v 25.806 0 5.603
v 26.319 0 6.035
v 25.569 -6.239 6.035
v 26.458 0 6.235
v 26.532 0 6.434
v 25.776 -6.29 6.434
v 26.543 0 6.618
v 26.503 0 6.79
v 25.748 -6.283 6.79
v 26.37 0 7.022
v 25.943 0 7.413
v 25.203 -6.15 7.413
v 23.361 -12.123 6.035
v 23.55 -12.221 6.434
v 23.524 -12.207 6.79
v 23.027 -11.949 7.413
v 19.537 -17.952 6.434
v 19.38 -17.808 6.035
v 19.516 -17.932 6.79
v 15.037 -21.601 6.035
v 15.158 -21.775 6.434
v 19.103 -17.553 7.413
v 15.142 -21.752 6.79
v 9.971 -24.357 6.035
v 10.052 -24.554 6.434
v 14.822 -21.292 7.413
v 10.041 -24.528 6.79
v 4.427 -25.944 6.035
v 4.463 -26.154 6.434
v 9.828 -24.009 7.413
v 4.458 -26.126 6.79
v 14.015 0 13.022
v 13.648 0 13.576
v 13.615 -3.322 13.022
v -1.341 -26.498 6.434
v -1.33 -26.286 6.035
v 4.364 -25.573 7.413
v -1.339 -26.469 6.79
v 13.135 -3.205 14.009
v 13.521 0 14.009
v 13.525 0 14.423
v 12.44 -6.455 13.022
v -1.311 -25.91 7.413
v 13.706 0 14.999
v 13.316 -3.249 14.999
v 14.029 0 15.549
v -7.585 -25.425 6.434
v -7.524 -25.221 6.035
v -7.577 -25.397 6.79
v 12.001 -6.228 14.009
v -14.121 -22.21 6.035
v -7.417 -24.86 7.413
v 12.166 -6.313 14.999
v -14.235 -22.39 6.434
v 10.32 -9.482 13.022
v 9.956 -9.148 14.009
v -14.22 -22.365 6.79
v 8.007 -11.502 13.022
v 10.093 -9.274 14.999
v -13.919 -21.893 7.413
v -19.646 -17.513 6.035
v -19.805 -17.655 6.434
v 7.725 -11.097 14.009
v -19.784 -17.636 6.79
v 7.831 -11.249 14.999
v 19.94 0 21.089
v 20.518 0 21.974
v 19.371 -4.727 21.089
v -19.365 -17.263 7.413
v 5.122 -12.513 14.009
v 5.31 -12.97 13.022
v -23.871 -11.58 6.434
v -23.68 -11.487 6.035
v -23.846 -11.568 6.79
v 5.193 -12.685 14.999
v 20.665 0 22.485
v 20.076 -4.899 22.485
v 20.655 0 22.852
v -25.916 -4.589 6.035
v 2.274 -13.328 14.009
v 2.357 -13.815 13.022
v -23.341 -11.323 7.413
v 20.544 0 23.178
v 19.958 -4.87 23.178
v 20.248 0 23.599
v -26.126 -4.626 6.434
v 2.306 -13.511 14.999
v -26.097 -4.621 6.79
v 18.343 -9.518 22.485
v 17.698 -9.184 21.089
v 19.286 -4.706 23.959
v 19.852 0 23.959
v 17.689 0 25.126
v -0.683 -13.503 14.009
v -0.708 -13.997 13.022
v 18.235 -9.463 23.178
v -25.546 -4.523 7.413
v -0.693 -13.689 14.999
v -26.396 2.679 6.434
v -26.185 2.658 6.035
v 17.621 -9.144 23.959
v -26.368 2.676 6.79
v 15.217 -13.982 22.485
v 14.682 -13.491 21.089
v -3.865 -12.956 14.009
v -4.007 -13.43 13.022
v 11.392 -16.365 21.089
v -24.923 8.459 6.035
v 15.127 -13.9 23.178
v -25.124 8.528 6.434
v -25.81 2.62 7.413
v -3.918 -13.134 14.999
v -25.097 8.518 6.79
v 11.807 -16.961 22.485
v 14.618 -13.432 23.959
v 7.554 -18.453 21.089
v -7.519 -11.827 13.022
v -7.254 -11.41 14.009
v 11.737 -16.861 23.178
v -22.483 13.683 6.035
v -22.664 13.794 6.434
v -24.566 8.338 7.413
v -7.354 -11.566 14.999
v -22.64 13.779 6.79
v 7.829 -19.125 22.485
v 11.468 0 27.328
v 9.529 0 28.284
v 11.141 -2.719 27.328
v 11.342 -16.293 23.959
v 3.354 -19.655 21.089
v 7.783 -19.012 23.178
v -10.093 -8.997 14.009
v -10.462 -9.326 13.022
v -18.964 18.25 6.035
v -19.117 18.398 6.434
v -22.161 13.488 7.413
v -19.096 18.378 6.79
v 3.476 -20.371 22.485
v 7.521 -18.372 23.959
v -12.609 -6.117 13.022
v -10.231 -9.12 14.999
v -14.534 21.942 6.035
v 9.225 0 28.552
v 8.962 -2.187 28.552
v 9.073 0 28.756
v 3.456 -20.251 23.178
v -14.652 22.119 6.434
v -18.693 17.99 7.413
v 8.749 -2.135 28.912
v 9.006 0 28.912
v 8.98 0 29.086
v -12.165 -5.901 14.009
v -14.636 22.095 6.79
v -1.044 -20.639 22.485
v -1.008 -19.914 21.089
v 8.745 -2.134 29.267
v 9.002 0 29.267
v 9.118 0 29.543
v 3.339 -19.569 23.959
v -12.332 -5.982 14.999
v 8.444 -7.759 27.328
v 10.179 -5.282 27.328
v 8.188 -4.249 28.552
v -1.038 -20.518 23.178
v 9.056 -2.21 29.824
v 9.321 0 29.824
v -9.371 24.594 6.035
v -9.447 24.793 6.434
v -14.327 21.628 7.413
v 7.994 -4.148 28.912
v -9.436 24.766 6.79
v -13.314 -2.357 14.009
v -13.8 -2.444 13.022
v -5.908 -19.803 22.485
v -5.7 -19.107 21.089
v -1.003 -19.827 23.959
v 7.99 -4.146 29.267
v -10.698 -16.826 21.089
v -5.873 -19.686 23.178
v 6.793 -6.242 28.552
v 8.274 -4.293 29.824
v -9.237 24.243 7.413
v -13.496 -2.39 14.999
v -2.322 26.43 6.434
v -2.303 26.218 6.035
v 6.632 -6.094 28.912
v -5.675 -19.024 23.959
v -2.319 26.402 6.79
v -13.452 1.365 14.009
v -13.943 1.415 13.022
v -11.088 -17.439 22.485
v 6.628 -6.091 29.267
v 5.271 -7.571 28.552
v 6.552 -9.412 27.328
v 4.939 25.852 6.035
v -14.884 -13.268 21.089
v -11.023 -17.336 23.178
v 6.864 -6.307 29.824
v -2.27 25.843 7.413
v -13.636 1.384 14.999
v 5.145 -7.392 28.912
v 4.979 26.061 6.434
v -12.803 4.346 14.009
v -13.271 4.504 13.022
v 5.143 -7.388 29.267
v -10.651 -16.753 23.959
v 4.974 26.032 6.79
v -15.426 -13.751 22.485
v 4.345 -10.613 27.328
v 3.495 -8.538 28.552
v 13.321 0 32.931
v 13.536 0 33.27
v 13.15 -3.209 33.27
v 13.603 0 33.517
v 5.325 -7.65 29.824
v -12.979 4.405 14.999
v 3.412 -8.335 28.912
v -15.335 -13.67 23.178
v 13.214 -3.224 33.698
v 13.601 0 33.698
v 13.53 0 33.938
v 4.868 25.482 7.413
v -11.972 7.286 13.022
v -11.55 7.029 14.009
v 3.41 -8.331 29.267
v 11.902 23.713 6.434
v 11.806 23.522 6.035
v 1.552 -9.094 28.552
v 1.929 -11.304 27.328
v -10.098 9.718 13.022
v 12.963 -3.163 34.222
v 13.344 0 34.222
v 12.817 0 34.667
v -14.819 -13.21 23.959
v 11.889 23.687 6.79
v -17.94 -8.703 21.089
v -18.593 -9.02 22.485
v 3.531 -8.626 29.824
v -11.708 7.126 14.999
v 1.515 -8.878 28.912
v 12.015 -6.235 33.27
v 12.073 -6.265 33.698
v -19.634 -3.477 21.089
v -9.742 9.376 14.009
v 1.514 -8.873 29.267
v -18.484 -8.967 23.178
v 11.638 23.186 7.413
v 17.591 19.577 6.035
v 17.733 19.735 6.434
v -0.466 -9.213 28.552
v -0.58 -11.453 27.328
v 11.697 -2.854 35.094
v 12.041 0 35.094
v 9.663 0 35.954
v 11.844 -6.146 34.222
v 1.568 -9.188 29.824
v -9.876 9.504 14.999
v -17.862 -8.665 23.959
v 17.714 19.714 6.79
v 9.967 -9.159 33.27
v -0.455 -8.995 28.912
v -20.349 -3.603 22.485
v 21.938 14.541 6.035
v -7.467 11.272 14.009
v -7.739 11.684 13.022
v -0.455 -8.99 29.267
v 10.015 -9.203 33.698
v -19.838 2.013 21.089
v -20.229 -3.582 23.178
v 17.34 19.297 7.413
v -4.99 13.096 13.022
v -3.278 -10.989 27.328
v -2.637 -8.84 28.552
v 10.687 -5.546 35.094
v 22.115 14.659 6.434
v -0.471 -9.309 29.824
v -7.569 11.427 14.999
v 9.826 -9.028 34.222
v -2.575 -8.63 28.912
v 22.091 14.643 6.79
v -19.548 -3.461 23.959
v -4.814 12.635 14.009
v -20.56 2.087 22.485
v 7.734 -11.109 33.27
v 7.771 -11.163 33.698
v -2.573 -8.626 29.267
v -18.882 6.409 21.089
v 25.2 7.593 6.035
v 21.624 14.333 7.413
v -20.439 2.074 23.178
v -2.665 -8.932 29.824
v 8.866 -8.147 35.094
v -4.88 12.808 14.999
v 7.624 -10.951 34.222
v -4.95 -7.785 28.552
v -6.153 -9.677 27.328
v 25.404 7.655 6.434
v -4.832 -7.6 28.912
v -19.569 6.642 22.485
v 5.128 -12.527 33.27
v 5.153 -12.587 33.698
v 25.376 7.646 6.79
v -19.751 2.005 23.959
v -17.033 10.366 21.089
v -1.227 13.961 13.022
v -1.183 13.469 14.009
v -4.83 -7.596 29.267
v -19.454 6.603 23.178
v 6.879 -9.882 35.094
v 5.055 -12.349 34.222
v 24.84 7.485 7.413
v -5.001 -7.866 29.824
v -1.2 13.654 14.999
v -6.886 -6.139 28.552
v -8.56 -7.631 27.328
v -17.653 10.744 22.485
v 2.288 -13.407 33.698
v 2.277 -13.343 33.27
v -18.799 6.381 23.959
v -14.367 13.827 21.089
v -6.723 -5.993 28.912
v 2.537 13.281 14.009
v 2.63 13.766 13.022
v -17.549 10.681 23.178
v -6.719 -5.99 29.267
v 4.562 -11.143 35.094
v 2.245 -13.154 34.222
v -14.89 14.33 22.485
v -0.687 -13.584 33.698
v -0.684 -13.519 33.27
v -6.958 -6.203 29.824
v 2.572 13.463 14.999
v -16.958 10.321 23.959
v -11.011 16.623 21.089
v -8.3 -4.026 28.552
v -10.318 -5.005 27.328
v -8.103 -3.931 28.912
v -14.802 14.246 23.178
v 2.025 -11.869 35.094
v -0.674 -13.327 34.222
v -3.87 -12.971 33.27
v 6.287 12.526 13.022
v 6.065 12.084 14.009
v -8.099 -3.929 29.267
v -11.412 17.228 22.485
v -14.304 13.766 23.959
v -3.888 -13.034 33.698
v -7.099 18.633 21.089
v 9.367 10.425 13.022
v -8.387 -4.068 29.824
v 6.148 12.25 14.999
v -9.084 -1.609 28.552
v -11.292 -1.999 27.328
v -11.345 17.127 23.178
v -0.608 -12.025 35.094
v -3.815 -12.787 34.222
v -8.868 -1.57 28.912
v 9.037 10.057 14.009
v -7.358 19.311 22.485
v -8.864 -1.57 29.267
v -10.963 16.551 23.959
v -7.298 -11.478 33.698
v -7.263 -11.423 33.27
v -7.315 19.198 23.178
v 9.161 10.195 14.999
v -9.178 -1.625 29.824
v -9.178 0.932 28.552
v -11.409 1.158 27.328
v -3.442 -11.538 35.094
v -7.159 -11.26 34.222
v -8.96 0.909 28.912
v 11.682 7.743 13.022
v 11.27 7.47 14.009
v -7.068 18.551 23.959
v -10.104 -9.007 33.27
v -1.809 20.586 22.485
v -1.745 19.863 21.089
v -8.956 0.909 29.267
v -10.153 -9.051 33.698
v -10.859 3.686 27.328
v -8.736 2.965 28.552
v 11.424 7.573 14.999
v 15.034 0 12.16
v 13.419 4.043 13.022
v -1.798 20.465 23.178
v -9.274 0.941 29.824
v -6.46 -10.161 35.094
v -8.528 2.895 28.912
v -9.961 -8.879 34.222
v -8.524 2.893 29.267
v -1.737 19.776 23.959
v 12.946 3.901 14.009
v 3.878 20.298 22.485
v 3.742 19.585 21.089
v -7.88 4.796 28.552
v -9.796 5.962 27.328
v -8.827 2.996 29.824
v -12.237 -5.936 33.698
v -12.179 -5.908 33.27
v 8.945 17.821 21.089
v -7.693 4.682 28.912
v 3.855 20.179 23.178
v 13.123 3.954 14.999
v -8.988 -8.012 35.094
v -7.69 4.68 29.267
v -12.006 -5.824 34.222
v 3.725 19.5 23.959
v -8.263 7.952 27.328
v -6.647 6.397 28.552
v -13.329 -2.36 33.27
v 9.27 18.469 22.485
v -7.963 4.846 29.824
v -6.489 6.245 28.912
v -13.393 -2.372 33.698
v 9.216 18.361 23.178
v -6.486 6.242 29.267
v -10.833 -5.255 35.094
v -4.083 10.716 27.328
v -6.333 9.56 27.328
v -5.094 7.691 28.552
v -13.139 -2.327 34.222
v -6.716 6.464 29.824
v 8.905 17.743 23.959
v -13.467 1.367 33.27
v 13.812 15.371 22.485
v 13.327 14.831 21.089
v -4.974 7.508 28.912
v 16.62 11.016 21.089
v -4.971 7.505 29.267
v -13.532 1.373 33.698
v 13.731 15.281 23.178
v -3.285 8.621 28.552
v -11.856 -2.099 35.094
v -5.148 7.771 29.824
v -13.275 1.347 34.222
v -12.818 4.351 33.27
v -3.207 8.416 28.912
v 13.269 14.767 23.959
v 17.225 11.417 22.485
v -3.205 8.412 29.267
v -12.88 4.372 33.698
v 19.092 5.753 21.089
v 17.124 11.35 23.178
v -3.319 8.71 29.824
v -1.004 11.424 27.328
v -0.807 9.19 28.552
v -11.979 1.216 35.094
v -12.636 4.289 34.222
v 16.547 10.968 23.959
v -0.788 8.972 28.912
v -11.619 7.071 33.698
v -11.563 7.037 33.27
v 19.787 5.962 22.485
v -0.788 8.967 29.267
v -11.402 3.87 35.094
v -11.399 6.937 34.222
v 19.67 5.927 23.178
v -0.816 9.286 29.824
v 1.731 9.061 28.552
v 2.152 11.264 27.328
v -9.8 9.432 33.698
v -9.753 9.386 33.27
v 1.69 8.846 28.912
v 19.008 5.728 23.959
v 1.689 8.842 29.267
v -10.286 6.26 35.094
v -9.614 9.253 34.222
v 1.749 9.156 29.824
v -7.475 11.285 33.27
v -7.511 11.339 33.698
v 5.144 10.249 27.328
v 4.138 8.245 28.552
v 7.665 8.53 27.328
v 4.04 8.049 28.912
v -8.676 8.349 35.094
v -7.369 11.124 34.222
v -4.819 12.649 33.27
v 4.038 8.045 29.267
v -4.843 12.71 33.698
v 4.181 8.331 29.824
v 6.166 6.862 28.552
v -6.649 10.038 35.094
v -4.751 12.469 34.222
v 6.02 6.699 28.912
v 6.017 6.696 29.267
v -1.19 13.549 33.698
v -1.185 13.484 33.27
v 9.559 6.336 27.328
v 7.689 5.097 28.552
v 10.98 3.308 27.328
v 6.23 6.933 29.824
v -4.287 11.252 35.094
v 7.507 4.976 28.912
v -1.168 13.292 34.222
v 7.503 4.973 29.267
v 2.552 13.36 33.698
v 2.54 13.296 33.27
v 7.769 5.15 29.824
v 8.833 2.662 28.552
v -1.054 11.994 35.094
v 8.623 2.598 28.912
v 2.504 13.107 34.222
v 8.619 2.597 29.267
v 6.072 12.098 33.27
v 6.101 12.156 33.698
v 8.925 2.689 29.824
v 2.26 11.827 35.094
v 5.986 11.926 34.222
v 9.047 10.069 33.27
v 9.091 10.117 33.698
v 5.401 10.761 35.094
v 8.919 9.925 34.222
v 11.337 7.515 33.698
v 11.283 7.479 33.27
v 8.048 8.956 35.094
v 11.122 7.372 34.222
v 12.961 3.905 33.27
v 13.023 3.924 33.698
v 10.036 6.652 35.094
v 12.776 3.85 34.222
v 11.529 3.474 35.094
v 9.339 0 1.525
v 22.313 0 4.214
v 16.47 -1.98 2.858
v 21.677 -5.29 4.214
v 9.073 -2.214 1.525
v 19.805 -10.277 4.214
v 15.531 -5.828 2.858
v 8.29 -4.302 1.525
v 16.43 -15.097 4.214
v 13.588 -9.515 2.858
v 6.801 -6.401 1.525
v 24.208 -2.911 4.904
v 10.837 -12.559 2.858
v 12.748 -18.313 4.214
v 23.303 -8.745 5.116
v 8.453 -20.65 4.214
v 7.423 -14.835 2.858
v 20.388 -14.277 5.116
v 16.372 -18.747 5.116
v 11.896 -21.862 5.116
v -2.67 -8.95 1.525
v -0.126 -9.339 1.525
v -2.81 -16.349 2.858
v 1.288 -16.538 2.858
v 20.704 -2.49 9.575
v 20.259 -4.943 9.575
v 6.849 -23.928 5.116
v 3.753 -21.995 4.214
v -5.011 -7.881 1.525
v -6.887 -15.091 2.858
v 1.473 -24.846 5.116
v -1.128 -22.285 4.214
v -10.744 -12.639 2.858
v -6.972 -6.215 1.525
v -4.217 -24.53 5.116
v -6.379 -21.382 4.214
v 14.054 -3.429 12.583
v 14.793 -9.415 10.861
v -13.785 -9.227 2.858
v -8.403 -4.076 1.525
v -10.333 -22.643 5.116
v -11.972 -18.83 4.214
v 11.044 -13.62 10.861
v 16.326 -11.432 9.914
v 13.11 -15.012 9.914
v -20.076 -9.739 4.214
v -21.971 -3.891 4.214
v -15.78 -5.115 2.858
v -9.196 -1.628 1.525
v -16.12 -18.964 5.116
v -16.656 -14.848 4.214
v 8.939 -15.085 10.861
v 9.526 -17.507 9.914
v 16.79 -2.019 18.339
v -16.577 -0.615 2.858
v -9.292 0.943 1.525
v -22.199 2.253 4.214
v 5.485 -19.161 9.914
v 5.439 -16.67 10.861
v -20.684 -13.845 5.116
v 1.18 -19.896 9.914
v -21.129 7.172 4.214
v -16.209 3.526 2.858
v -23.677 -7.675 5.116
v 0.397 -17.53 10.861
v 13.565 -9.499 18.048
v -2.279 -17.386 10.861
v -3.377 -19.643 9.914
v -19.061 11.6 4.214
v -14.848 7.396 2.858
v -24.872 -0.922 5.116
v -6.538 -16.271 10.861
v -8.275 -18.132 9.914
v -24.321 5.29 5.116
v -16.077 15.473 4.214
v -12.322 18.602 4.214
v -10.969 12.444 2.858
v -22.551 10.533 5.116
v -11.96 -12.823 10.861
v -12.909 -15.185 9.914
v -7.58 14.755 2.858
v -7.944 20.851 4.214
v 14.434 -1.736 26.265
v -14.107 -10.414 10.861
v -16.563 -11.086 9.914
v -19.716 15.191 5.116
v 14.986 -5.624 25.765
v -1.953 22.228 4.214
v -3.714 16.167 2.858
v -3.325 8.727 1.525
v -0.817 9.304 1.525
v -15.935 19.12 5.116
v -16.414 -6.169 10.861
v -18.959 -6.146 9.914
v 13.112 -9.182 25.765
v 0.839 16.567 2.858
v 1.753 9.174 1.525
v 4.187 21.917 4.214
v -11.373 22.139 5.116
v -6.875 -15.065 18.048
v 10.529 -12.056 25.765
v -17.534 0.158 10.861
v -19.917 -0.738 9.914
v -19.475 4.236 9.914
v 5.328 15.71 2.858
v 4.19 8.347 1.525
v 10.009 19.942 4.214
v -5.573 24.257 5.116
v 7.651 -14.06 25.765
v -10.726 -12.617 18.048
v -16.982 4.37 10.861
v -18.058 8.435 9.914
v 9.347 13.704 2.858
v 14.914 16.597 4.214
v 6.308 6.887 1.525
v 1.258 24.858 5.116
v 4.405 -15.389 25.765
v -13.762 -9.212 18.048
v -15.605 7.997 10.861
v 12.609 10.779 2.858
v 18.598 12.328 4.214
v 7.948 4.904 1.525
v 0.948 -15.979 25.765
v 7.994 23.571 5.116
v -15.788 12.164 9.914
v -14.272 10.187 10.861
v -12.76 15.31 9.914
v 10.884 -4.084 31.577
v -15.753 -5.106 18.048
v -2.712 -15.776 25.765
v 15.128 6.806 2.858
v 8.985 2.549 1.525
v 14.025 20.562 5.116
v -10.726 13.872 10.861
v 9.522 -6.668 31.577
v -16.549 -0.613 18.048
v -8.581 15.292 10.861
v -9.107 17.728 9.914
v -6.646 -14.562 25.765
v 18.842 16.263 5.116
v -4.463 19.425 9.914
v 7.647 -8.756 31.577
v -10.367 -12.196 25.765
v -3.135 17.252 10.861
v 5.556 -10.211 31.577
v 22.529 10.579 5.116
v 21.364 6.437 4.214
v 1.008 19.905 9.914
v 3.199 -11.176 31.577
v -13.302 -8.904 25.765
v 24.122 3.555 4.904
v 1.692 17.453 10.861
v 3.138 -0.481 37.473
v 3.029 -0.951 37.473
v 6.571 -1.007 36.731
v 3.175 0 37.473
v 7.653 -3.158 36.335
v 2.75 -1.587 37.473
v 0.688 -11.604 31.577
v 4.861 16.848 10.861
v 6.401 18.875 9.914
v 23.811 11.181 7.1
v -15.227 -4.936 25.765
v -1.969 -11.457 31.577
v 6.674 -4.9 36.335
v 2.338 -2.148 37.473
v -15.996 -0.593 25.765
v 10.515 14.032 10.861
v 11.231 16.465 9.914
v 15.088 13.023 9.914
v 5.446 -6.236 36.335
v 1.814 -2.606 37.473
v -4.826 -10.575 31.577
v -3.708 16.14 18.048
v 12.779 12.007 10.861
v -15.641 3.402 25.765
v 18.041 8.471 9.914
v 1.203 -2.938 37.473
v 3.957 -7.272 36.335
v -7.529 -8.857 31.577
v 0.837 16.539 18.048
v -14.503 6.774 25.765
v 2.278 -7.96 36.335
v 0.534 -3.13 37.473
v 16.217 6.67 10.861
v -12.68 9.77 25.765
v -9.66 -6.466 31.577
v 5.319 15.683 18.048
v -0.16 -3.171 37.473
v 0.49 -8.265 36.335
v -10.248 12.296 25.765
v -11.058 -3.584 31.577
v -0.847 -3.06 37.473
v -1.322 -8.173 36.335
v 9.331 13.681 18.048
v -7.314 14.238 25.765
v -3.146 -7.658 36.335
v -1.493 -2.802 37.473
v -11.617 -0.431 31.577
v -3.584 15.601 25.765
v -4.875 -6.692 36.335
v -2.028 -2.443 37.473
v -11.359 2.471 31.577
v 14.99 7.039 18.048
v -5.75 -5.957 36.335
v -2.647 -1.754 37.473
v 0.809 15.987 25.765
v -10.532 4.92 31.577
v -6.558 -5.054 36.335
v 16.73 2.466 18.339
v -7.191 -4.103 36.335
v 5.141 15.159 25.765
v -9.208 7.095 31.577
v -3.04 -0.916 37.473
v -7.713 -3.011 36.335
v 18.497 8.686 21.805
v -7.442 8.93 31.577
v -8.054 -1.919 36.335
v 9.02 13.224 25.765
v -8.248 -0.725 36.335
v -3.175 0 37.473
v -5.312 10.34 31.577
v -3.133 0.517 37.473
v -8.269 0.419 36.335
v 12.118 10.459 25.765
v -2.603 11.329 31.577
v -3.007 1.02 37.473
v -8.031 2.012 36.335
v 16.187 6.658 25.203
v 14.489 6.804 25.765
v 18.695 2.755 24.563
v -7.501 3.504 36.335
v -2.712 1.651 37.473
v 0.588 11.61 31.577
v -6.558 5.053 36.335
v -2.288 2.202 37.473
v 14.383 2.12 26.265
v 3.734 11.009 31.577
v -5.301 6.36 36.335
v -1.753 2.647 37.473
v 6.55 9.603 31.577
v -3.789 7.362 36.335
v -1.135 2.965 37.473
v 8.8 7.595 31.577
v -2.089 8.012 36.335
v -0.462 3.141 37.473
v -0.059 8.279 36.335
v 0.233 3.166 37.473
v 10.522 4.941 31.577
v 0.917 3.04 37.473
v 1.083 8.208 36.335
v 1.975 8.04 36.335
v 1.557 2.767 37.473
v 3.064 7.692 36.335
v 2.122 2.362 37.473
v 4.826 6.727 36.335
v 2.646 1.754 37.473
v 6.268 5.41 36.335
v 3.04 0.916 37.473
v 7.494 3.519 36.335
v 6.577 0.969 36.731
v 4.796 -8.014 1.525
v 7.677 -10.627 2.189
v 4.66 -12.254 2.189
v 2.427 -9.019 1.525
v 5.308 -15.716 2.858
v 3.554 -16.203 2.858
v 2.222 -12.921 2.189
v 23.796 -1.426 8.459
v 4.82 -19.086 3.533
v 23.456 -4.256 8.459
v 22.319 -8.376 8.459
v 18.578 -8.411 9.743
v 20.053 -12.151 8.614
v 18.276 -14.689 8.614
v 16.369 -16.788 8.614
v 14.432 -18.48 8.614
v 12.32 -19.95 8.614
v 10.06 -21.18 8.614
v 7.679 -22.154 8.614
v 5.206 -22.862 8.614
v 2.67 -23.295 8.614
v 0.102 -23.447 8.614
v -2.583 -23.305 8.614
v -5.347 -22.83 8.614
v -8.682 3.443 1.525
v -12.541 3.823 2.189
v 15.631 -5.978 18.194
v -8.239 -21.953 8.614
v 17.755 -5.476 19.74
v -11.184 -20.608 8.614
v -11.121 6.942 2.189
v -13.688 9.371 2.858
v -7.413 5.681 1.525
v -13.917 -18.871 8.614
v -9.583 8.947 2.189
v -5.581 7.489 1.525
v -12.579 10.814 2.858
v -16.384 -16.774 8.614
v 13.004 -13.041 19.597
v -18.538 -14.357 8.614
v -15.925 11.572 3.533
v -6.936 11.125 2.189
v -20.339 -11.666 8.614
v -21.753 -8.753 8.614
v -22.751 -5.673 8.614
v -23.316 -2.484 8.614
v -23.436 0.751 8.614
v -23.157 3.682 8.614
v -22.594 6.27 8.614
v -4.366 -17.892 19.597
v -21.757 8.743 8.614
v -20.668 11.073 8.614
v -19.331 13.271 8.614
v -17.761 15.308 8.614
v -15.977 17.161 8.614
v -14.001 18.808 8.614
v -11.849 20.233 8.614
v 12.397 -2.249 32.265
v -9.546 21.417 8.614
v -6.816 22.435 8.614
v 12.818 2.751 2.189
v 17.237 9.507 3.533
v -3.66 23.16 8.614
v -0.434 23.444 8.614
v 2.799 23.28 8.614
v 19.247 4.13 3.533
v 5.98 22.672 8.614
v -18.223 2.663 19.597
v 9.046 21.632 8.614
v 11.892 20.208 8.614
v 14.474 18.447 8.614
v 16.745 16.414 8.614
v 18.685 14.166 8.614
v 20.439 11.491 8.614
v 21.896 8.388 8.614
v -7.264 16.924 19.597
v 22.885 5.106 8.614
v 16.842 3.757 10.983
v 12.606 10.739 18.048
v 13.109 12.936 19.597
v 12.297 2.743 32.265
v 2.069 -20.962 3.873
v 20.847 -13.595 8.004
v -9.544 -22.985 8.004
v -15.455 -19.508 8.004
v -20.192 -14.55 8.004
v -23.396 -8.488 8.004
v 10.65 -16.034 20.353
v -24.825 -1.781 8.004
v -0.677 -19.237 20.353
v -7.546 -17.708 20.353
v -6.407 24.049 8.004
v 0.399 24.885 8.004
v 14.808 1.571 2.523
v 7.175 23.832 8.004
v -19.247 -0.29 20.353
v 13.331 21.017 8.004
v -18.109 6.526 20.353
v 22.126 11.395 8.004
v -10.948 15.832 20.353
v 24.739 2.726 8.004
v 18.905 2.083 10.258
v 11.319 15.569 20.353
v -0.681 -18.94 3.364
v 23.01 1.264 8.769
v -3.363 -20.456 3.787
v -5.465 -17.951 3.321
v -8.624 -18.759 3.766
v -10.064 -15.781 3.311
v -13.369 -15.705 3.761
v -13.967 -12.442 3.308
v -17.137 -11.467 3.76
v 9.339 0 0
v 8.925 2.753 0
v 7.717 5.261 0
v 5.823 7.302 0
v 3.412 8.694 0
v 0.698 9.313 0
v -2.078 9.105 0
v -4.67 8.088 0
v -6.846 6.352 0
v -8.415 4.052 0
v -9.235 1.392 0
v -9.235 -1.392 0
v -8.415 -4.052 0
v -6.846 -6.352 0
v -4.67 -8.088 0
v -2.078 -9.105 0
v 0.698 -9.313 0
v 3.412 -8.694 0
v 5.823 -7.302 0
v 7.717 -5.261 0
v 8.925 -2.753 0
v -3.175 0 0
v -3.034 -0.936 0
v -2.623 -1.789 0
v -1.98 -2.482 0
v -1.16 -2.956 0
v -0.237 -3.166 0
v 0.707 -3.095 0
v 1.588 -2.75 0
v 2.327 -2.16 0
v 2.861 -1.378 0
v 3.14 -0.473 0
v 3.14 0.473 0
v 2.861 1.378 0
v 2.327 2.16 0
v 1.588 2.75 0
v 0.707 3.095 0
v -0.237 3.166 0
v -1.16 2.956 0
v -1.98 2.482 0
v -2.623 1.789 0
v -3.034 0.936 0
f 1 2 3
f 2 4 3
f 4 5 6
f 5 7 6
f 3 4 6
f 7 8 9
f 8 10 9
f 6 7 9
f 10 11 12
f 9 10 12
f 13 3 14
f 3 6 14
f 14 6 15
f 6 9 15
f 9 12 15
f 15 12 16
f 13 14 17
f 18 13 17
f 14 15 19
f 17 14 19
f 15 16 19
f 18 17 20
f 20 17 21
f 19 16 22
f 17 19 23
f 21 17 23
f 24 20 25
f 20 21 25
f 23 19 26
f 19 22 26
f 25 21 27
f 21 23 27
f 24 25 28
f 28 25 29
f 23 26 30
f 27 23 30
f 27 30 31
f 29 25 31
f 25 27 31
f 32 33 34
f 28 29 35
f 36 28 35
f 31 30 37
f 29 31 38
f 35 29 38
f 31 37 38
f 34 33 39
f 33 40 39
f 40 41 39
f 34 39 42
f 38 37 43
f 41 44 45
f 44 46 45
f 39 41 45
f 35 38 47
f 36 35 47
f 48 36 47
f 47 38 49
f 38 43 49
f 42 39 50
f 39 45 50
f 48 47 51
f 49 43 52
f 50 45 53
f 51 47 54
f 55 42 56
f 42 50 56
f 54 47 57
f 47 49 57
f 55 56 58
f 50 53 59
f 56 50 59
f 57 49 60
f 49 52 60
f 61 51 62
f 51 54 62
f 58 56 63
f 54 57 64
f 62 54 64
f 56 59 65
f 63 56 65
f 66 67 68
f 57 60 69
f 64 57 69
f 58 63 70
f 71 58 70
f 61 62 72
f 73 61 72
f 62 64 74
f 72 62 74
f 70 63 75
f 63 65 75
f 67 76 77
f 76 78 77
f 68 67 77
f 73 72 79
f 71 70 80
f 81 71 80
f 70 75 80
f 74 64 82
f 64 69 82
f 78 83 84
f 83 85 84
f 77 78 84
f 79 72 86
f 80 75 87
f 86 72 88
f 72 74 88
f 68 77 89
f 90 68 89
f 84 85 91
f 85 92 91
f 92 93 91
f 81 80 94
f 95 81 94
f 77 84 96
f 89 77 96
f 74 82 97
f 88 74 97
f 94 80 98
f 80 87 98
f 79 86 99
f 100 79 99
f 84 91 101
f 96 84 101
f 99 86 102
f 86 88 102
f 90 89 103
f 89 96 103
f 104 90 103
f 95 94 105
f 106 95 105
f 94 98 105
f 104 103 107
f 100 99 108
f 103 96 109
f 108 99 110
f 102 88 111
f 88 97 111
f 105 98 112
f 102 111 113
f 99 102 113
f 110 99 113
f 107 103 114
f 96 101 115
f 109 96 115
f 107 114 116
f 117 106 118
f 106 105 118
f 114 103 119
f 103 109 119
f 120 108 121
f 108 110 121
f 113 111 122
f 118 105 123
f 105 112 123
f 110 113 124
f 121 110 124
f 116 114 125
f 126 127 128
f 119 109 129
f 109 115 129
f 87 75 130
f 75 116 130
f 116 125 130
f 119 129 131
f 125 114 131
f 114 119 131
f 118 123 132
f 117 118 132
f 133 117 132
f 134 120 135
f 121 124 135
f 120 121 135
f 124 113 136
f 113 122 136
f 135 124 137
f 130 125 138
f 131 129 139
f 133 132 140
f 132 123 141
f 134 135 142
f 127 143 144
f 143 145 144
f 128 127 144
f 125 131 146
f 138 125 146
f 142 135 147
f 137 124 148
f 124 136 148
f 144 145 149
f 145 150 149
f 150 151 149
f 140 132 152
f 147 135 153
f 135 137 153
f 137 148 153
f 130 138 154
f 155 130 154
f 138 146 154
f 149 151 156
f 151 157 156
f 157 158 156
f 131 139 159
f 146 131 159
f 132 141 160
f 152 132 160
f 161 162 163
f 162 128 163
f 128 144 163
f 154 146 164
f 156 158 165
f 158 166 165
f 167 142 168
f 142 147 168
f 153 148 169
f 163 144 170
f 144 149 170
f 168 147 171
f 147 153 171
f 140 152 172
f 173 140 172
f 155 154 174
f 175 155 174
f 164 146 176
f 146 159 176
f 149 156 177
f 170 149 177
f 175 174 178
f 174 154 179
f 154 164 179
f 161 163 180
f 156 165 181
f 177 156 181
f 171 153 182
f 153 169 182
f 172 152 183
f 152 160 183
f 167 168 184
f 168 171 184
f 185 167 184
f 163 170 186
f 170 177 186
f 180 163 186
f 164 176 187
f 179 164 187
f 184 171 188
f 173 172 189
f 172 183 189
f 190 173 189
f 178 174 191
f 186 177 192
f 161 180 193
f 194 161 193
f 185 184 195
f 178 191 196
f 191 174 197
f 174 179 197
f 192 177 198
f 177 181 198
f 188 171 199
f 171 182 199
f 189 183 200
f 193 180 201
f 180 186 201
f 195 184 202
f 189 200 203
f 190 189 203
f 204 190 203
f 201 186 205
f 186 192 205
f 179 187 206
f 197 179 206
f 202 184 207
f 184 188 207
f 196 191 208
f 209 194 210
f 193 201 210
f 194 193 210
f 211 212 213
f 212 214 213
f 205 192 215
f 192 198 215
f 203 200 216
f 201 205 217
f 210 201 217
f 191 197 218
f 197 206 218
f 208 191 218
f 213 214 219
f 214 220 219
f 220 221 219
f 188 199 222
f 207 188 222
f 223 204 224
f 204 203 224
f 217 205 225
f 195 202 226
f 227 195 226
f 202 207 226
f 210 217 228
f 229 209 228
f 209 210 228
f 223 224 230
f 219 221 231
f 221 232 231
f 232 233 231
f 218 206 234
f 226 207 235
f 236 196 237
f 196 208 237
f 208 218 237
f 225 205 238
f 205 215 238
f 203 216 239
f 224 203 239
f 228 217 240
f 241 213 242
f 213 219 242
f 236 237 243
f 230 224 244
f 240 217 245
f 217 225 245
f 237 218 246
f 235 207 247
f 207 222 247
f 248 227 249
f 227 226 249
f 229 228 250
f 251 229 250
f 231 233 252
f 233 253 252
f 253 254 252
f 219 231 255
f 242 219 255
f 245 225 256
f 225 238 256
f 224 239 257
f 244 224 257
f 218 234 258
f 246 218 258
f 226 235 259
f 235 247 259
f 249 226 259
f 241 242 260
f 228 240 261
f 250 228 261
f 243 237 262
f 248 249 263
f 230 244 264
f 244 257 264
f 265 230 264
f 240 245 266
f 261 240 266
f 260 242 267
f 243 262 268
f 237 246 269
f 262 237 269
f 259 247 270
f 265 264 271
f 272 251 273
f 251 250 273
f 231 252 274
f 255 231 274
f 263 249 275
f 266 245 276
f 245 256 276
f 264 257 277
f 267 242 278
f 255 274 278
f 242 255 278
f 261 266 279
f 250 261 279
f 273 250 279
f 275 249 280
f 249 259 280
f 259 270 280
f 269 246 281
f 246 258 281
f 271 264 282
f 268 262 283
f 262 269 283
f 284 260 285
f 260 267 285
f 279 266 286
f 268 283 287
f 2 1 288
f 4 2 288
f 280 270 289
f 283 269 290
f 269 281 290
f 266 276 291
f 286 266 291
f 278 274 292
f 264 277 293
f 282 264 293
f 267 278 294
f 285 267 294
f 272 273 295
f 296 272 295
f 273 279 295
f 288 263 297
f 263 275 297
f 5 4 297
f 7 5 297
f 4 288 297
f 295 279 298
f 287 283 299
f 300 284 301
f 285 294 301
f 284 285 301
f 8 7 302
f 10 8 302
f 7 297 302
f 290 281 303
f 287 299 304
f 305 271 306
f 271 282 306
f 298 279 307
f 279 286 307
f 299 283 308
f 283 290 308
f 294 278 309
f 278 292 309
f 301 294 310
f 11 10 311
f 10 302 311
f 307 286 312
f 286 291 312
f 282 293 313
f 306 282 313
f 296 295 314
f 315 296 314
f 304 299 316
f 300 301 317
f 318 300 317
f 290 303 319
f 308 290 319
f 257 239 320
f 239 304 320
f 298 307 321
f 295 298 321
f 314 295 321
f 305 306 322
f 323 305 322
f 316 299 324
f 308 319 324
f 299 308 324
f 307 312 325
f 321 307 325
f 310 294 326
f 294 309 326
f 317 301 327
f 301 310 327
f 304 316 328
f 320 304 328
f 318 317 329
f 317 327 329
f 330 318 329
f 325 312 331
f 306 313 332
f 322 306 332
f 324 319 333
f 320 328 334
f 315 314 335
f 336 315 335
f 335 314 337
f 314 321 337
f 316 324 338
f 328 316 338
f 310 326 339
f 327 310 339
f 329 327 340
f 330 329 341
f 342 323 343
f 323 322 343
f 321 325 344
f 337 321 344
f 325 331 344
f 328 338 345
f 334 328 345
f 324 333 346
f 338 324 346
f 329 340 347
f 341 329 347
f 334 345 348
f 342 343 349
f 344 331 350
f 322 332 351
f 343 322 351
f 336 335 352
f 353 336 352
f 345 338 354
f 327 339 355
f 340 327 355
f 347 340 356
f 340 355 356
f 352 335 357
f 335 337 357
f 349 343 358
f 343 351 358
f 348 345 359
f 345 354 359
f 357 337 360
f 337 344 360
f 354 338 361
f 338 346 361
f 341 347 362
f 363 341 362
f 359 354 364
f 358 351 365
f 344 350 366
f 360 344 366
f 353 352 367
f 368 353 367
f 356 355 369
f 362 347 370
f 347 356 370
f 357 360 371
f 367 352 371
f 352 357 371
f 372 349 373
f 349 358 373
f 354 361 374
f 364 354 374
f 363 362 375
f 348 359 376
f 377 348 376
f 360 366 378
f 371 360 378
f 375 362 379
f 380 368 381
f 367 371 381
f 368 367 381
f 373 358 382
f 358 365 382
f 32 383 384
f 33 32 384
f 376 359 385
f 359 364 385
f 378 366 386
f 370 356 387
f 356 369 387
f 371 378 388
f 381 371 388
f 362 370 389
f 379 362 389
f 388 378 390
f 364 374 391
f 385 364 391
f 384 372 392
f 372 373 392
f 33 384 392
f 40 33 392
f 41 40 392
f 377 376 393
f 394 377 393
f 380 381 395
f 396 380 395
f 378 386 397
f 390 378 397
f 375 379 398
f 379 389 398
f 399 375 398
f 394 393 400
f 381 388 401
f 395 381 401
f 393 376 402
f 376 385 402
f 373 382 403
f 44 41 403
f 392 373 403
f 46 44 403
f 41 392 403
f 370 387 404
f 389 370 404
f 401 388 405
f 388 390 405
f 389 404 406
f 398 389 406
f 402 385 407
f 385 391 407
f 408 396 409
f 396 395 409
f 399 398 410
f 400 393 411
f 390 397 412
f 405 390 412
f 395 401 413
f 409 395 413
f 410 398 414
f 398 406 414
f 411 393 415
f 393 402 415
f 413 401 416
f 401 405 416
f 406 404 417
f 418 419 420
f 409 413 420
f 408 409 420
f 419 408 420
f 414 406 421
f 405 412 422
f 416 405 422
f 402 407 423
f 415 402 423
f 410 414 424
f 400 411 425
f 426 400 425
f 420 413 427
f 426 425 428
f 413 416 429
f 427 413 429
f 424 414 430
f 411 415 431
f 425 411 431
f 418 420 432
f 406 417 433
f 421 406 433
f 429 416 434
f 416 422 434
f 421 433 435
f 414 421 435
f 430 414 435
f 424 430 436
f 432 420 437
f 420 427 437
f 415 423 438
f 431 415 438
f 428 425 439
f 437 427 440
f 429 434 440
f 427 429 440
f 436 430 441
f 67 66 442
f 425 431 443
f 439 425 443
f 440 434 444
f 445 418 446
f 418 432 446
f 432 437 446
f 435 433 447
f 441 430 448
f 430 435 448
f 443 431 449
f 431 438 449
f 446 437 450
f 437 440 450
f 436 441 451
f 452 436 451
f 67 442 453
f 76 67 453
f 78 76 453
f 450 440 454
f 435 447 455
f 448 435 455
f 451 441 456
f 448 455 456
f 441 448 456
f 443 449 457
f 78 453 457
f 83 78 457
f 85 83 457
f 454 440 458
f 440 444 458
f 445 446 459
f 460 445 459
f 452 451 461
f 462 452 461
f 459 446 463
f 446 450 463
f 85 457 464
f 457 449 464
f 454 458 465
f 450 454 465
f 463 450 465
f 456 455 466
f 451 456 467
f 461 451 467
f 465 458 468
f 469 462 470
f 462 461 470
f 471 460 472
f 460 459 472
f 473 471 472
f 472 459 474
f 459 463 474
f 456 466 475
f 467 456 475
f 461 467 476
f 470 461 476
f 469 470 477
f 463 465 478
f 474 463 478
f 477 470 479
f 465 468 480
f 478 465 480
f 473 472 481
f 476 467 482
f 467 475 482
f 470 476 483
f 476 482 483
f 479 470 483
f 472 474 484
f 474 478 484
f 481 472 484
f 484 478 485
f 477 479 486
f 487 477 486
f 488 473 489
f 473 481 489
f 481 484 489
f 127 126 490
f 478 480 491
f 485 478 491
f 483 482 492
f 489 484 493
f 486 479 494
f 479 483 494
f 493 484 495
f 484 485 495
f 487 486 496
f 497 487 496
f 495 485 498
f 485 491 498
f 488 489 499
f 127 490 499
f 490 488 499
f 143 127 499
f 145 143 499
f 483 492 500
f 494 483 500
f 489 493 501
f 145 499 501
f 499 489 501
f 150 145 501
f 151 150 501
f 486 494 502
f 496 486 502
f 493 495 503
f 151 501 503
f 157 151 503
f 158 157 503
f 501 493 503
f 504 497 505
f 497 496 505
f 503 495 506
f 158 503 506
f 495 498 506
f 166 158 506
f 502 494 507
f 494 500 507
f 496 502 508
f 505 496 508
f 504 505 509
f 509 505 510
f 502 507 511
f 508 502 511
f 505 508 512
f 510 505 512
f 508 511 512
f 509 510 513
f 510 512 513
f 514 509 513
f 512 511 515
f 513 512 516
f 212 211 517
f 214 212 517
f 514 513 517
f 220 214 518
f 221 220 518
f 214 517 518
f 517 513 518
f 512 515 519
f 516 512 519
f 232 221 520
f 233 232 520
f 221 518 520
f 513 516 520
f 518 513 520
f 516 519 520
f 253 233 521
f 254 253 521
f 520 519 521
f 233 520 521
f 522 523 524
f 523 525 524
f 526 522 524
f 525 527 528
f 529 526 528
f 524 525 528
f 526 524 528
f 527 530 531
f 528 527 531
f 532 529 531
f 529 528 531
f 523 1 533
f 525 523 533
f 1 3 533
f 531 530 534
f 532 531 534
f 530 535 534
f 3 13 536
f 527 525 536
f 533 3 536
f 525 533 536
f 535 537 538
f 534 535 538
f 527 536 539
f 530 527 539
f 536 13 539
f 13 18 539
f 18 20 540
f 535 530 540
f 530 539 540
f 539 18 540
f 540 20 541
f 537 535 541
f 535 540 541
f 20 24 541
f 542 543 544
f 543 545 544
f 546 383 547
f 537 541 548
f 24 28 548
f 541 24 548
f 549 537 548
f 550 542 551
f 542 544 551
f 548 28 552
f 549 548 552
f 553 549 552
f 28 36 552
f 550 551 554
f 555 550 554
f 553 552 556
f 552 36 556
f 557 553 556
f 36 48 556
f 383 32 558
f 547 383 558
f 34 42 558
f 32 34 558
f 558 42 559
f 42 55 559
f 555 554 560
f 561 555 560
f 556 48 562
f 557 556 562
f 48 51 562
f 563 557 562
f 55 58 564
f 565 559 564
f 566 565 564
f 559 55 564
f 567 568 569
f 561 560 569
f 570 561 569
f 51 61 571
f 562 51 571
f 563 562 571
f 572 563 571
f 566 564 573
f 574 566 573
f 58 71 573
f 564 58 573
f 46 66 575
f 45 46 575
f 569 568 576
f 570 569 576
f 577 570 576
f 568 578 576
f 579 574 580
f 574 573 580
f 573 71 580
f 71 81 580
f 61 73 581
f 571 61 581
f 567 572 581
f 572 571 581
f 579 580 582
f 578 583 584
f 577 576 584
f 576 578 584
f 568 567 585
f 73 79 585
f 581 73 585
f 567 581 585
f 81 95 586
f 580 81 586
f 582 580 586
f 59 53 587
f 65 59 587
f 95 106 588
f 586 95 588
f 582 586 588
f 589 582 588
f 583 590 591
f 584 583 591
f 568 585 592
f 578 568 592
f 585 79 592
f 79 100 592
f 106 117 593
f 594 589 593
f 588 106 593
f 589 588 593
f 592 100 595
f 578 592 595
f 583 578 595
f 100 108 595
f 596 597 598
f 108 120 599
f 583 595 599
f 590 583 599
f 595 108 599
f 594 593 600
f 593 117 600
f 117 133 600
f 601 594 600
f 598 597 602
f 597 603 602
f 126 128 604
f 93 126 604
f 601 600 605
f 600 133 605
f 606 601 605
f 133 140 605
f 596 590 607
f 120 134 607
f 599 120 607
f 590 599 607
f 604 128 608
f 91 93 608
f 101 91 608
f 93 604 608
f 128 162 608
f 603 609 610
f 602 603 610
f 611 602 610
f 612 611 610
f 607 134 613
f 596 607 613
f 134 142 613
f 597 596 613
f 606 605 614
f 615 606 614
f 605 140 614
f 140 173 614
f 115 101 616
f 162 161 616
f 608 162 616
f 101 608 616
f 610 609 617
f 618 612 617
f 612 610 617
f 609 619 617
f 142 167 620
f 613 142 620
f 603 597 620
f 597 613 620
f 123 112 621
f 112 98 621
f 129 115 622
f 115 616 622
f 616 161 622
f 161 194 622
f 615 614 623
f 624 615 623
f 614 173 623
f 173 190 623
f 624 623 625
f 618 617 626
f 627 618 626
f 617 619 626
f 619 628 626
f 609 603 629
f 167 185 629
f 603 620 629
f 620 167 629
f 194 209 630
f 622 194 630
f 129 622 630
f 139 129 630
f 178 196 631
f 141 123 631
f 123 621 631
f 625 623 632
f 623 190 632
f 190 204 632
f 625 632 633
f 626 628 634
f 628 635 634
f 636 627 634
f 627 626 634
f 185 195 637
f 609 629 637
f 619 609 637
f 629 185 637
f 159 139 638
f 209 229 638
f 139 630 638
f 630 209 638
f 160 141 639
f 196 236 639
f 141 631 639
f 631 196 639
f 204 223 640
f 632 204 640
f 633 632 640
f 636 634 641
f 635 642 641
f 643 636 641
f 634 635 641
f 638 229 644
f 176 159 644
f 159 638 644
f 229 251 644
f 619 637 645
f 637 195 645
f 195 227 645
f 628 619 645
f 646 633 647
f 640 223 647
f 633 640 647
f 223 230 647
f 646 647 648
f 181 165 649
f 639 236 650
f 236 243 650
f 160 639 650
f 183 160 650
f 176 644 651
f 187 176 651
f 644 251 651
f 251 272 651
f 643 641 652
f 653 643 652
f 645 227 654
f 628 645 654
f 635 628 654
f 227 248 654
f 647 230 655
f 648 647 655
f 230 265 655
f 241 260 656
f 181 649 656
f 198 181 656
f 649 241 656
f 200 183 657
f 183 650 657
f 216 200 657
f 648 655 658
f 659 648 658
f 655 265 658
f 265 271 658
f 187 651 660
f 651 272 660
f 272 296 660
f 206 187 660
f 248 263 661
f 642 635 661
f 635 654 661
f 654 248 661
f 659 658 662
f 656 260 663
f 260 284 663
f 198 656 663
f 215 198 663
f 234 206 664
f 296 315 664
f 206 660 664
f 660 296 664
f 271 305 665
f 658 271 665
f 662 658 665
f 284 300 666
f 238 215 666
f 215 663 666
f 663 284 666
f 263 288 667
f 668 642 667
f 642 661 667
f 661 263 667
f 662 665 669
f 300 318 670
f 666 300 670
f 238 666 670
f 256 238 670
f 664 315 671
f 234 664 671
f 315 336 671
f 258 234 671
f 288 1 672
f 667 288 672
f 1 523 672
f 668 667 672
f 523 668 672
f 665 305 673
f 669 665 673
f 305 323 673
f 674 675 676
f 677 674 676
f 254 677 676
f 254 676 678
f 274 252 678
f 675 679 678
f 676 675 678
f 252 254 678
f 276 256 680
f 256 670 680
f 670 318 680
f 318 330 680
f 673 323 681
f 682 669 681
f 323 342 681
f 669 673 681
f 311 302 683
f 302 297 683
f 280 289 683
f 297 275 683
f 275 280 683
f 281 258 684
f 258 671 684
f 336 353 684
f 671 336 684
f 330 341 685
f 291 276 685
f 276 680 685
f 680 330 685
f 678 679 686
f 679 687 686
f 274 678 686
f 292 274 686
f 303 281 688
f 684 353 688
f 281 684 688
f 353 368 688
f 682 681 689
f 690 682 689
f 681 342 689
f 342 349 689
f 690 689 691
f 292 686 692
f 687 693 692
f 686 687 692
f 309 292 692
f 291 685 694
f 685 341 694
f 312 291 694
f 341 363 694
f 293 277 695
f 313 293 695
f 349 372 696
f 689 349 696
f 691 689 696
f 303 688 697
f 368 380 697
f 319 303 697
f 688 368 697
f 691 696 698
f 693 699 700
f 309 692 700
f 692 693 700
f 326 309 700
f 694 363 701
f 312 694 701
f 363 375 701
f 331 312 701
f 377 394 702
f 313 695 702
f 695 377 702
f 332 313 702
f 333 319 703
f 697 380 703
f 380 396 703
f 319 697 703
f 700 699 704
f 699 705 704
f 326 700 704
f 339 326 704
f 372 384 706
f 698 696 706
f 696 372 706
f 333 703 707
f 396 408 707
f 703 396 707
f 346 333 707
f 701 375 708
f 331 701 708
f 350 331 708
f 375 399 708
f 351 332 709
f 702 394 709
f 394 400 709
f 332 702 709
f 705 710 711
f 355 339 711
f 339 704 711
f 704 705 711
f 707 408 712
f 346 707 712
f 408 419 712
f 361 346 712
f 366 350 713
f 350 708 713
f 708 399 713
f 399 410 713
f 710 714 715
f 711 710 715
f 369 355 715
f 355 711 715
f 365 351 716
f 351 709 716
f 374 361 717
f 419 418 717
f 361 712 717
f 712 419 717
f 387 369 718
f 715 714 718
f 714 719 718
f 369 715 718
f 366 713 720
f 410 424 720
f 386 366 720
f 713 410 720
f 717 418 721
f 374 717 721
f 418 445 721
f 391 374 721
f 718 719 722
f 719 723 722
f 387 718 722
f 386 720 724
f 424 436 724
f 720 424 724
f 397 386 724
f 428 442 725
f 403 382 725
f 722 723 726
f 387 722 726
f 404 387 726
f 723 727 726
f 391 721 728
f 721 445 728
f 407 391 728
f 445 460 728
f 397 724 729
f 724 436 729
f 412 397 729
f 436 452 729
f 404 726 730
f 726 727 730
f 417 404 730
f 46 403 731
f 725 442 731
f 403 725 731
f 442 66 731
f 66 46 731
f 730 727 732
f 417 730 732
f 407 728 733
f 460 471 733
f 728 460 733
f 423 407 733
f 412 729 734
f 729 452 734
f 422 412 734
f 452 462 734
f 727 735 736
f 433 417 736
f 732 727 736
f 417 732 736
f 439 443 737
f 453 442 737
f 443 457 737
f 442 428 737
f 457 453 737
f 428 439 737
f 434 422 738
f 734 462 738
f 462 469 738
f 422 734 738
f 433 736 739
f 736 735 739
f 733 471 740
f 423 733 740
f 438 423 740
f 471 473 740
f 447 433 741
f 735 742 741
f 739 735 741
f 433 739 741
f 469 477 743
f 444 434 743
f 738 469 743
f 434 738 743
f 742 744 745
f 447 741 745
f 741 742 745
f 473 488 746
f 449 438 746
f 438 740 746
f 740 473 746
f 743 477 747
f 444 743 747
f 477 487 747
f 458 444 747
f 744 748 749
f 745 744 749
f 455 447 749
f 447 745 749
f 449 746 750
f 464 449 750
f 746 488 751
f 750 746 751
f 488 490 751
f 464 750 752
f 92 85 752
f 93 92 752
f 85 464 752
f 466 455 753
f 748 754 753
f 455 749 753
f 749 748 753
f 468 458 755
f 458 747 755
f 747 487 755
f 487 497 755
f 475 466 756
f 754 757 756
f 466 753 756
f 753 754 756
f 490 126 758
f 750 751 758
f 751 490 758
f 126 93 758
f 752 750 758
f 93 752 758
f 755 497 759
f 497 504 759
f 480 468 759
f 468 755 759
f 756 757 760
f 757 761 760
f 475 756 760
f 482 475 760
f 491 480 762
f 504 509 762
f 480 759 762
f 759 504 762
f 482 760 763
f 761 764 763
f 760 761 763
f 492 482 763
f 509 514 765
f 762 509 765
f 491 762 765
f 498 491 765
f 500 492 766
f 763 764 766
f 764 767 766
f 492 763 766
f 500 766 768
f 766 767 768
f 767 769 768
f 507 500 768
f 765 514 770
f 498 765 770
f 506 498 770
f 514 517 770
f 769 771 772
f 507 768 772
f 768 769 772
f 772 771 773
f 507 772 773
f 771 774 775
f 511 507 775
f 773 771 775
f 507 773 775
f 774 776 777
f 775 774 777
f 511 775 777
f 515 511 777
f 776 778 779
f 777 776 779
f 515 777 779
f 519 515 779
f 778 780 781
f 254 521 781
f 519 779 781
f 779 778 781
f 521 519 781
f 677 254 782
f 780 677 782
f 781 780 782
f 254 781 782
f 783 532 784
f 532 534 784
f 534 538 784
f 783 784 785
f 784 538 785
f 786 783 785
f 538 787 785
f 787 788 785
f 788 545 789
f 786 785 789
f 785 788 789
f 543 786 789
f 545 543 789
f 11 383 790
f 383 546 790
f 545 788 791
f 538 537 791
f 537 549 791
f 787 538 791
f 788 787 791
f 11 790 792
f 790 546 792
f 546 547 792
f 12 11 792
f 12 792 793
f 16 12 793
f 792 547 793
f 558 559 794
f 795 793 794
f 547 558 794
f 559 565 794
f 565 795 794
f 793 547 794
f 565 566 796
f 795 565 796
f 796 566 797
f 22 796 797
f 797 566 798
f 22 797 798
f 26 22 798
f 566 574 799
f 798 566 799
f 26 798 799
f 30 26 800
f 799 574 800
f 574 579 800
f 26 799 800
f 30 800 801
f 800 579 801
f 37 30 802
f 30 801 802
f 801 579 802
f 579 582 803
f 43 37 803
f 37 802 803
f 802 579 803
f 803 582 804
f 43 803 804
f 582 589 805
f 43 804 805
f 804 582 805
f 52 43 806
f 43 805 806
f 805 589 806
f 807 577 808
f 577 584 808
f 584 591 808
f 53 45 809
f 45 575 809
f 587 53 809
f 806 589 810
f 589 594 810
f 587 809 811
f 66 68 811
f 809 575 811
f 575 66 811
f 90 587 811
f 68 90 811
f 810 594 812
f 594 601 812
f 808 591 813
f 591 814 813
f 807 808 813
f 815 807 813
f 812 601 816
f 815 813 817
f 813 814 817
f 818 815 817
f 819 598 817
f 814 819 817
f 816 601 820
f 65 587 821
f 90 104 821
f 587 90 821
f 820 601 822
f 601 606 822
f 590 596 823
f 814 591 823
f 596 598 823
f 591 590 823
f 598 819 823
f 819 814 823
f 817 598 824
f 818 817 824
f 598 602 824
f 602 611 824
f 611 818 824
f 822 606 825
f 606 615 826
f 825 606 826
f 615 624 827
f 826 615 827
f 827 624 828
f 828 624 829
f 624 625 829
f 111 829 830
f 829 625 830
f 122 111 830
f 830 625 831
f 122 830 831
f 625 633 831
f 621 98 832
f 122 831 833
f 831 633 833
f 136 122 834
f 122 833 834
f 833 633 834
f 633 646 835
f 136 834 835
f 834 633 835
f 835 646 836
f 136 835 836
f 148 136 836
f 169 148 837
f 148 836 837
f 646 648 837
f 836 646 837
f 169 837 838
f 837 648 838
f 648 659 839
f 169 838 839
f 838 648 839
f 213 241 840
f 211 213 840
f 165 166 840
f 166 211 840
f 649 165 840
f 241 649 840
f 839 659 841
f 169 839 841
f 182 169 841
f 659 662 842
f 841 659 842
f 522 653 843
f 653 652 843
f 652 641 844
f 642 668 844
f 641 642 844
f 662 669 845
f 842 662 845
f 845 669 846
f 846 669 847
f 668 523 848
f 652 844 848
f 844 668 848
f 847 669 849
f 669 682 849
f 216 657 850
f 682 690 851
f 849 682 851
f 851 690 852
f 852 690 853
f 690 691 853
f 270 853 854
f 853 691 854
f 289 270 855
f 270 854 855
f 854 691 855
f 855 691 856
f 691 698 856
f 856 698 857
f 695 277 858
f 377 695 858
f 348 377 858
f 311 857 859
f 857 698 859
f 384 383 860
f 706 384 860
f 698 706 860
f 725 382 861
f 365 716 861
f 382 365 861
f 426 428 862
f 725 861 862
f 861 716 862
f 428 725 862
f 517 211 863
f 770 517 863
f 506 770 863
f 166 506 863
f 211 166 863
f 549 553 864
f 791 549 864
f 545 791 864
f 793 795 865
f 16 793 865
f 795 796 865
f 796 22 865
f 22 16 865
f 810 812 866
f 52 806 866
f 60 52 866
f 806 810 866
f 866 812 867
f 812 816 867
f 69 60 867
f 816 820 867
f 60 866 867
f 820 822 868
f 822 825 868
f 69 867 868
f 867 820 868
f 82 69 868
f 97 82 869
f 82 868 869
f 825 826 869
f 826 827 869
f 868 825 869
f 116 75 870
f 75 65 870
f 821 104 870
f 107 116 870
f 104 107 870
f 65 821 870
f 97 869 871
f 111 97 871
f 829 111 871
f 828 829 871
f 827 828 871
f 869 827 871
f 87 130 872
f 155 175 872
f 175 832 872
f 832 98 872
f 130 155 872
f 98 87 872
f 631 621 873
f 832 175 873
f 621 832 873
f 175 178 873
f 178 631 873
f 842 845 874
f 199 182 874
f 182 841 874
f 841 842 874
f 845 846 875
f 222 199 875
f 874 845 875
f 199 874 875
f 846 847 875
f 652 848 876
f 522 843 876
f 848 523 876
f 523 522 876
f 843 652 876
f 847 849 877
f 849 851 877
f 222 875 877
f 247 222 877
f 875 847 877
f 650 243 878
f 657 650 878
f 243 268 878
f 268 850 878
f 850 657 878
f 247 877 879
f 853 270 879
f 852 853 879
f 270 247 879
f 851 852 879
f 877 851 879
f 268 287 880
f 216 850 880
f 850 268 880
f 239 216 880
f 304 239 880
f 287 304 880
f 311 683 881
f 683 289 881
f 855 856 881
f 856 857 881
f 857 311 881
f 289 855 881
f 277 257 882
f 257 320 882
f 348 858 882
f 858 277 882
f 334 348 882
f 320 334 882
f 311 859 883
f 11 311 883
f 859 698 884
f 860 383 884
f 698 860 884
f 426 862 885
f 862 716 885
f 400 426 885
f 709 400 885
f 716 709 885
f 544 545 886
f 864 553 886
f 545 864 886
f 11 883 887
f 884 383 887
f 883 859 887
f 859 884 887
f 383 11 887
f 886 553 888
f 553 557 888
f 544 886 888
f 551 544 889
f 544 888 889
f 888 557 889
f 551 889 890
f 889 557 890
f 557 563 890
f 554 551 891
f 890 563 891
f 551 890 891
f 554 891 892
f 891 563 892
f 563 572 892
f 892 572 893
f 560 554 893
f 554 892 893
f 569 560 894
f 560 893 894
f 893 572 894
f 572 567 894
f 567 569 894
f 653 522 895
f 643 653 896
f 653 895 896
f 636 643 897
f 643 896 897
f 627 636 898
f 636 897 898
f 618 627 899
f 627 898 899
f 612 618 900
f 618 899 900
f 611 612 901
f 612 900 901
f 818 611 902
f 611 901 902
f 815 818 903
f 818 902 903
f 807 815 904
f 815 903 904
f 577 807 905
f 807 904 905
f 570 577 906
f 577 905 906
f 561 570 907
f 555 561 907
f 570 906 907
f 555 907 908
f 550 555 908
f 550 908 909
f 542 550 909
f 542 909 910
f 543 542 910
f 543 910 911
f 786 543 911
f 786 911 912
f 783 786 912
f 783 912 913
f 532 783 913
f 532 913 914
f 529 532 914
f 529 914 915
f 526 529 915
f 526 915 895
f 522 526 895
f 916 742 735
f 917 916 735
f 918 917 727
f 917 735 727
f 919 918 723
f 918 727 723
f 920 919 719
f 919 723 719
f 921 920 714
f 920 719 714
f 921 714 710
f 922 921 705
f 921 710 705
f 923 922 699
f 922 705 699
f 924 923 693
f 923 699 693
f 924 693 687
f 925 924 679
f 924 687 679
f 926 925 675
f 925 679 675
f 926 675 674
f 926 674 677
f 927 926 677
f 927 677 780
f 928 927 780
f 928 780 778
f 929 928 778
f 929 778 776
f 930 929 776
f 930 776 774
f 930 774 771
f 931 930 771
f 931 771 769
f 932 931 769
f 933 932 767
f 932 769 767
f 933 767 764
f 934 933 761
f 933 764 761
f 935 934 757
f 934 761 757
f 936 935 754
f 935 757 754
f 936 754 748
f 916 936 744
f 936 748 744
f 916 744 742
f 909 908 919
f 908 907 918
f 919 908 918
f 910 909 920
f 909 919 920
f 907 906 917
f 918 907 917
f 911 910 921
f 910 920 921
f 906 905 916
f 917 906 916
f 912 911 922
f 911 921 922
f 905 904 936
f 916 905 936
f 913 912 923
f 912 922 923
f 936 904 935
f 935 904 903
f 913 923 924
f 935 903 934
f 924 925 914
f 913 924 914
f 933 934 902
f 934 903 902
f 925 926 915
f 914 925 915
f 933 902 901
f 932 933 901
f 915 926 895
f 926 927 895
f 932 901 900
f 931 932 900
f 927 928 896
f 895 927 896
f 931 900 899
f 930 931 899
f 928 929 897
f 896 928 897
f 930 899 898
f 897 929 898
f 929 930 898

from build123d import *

# Parameters (mm, degrees)
F2_R     = 9.3394662064
F3_DEPTH = 12.7
F5_D     = 6.35


with BuildPart() as f1:
    # F0 (on Front) → F1 (revolve)
    with BuildSketch(Plane.XZ):
        with BuildLine():
            Line((0, 38.1), (0, 0))
            add(Edge.make_bspline(
                [(0, 0), (14.350977372, 2.2945801413), (39.1855557702, 6.2653849814), (4.3012712165, 12.7381315434), (29.7354424134, 24.2806495401), (2.422248214, 27.9041384292), (19.3085066306, 34.3315694195), (7.2616463998, 36.6827484807), (0, 38.1)],
                knots=[0, 0, 0, 0, 0.2339384907, 0.4048340149, 0.5558357804, 0.7180755229, 0.8300606279, 1, 1, 1, 1], degree=3))
        make_face()
    revolve(axis=Axis((0, 0, 19.05), (0, 0, -1)))

    # F2 (on Top) → F3 (join)
    with BuildSketch(Plane.XY):
        Circle(F2_R)
    extrude(amount=F3_DEPTH)

    # F5 (through all)
    with Locations(Plane(origin=(0, 0, 0), x_dir=(1, 0, 0), z_dir=(0, 0, -1))):
        with Locations((0, 0)):
            Hole(F5_D / 2)


solid = f1.part
